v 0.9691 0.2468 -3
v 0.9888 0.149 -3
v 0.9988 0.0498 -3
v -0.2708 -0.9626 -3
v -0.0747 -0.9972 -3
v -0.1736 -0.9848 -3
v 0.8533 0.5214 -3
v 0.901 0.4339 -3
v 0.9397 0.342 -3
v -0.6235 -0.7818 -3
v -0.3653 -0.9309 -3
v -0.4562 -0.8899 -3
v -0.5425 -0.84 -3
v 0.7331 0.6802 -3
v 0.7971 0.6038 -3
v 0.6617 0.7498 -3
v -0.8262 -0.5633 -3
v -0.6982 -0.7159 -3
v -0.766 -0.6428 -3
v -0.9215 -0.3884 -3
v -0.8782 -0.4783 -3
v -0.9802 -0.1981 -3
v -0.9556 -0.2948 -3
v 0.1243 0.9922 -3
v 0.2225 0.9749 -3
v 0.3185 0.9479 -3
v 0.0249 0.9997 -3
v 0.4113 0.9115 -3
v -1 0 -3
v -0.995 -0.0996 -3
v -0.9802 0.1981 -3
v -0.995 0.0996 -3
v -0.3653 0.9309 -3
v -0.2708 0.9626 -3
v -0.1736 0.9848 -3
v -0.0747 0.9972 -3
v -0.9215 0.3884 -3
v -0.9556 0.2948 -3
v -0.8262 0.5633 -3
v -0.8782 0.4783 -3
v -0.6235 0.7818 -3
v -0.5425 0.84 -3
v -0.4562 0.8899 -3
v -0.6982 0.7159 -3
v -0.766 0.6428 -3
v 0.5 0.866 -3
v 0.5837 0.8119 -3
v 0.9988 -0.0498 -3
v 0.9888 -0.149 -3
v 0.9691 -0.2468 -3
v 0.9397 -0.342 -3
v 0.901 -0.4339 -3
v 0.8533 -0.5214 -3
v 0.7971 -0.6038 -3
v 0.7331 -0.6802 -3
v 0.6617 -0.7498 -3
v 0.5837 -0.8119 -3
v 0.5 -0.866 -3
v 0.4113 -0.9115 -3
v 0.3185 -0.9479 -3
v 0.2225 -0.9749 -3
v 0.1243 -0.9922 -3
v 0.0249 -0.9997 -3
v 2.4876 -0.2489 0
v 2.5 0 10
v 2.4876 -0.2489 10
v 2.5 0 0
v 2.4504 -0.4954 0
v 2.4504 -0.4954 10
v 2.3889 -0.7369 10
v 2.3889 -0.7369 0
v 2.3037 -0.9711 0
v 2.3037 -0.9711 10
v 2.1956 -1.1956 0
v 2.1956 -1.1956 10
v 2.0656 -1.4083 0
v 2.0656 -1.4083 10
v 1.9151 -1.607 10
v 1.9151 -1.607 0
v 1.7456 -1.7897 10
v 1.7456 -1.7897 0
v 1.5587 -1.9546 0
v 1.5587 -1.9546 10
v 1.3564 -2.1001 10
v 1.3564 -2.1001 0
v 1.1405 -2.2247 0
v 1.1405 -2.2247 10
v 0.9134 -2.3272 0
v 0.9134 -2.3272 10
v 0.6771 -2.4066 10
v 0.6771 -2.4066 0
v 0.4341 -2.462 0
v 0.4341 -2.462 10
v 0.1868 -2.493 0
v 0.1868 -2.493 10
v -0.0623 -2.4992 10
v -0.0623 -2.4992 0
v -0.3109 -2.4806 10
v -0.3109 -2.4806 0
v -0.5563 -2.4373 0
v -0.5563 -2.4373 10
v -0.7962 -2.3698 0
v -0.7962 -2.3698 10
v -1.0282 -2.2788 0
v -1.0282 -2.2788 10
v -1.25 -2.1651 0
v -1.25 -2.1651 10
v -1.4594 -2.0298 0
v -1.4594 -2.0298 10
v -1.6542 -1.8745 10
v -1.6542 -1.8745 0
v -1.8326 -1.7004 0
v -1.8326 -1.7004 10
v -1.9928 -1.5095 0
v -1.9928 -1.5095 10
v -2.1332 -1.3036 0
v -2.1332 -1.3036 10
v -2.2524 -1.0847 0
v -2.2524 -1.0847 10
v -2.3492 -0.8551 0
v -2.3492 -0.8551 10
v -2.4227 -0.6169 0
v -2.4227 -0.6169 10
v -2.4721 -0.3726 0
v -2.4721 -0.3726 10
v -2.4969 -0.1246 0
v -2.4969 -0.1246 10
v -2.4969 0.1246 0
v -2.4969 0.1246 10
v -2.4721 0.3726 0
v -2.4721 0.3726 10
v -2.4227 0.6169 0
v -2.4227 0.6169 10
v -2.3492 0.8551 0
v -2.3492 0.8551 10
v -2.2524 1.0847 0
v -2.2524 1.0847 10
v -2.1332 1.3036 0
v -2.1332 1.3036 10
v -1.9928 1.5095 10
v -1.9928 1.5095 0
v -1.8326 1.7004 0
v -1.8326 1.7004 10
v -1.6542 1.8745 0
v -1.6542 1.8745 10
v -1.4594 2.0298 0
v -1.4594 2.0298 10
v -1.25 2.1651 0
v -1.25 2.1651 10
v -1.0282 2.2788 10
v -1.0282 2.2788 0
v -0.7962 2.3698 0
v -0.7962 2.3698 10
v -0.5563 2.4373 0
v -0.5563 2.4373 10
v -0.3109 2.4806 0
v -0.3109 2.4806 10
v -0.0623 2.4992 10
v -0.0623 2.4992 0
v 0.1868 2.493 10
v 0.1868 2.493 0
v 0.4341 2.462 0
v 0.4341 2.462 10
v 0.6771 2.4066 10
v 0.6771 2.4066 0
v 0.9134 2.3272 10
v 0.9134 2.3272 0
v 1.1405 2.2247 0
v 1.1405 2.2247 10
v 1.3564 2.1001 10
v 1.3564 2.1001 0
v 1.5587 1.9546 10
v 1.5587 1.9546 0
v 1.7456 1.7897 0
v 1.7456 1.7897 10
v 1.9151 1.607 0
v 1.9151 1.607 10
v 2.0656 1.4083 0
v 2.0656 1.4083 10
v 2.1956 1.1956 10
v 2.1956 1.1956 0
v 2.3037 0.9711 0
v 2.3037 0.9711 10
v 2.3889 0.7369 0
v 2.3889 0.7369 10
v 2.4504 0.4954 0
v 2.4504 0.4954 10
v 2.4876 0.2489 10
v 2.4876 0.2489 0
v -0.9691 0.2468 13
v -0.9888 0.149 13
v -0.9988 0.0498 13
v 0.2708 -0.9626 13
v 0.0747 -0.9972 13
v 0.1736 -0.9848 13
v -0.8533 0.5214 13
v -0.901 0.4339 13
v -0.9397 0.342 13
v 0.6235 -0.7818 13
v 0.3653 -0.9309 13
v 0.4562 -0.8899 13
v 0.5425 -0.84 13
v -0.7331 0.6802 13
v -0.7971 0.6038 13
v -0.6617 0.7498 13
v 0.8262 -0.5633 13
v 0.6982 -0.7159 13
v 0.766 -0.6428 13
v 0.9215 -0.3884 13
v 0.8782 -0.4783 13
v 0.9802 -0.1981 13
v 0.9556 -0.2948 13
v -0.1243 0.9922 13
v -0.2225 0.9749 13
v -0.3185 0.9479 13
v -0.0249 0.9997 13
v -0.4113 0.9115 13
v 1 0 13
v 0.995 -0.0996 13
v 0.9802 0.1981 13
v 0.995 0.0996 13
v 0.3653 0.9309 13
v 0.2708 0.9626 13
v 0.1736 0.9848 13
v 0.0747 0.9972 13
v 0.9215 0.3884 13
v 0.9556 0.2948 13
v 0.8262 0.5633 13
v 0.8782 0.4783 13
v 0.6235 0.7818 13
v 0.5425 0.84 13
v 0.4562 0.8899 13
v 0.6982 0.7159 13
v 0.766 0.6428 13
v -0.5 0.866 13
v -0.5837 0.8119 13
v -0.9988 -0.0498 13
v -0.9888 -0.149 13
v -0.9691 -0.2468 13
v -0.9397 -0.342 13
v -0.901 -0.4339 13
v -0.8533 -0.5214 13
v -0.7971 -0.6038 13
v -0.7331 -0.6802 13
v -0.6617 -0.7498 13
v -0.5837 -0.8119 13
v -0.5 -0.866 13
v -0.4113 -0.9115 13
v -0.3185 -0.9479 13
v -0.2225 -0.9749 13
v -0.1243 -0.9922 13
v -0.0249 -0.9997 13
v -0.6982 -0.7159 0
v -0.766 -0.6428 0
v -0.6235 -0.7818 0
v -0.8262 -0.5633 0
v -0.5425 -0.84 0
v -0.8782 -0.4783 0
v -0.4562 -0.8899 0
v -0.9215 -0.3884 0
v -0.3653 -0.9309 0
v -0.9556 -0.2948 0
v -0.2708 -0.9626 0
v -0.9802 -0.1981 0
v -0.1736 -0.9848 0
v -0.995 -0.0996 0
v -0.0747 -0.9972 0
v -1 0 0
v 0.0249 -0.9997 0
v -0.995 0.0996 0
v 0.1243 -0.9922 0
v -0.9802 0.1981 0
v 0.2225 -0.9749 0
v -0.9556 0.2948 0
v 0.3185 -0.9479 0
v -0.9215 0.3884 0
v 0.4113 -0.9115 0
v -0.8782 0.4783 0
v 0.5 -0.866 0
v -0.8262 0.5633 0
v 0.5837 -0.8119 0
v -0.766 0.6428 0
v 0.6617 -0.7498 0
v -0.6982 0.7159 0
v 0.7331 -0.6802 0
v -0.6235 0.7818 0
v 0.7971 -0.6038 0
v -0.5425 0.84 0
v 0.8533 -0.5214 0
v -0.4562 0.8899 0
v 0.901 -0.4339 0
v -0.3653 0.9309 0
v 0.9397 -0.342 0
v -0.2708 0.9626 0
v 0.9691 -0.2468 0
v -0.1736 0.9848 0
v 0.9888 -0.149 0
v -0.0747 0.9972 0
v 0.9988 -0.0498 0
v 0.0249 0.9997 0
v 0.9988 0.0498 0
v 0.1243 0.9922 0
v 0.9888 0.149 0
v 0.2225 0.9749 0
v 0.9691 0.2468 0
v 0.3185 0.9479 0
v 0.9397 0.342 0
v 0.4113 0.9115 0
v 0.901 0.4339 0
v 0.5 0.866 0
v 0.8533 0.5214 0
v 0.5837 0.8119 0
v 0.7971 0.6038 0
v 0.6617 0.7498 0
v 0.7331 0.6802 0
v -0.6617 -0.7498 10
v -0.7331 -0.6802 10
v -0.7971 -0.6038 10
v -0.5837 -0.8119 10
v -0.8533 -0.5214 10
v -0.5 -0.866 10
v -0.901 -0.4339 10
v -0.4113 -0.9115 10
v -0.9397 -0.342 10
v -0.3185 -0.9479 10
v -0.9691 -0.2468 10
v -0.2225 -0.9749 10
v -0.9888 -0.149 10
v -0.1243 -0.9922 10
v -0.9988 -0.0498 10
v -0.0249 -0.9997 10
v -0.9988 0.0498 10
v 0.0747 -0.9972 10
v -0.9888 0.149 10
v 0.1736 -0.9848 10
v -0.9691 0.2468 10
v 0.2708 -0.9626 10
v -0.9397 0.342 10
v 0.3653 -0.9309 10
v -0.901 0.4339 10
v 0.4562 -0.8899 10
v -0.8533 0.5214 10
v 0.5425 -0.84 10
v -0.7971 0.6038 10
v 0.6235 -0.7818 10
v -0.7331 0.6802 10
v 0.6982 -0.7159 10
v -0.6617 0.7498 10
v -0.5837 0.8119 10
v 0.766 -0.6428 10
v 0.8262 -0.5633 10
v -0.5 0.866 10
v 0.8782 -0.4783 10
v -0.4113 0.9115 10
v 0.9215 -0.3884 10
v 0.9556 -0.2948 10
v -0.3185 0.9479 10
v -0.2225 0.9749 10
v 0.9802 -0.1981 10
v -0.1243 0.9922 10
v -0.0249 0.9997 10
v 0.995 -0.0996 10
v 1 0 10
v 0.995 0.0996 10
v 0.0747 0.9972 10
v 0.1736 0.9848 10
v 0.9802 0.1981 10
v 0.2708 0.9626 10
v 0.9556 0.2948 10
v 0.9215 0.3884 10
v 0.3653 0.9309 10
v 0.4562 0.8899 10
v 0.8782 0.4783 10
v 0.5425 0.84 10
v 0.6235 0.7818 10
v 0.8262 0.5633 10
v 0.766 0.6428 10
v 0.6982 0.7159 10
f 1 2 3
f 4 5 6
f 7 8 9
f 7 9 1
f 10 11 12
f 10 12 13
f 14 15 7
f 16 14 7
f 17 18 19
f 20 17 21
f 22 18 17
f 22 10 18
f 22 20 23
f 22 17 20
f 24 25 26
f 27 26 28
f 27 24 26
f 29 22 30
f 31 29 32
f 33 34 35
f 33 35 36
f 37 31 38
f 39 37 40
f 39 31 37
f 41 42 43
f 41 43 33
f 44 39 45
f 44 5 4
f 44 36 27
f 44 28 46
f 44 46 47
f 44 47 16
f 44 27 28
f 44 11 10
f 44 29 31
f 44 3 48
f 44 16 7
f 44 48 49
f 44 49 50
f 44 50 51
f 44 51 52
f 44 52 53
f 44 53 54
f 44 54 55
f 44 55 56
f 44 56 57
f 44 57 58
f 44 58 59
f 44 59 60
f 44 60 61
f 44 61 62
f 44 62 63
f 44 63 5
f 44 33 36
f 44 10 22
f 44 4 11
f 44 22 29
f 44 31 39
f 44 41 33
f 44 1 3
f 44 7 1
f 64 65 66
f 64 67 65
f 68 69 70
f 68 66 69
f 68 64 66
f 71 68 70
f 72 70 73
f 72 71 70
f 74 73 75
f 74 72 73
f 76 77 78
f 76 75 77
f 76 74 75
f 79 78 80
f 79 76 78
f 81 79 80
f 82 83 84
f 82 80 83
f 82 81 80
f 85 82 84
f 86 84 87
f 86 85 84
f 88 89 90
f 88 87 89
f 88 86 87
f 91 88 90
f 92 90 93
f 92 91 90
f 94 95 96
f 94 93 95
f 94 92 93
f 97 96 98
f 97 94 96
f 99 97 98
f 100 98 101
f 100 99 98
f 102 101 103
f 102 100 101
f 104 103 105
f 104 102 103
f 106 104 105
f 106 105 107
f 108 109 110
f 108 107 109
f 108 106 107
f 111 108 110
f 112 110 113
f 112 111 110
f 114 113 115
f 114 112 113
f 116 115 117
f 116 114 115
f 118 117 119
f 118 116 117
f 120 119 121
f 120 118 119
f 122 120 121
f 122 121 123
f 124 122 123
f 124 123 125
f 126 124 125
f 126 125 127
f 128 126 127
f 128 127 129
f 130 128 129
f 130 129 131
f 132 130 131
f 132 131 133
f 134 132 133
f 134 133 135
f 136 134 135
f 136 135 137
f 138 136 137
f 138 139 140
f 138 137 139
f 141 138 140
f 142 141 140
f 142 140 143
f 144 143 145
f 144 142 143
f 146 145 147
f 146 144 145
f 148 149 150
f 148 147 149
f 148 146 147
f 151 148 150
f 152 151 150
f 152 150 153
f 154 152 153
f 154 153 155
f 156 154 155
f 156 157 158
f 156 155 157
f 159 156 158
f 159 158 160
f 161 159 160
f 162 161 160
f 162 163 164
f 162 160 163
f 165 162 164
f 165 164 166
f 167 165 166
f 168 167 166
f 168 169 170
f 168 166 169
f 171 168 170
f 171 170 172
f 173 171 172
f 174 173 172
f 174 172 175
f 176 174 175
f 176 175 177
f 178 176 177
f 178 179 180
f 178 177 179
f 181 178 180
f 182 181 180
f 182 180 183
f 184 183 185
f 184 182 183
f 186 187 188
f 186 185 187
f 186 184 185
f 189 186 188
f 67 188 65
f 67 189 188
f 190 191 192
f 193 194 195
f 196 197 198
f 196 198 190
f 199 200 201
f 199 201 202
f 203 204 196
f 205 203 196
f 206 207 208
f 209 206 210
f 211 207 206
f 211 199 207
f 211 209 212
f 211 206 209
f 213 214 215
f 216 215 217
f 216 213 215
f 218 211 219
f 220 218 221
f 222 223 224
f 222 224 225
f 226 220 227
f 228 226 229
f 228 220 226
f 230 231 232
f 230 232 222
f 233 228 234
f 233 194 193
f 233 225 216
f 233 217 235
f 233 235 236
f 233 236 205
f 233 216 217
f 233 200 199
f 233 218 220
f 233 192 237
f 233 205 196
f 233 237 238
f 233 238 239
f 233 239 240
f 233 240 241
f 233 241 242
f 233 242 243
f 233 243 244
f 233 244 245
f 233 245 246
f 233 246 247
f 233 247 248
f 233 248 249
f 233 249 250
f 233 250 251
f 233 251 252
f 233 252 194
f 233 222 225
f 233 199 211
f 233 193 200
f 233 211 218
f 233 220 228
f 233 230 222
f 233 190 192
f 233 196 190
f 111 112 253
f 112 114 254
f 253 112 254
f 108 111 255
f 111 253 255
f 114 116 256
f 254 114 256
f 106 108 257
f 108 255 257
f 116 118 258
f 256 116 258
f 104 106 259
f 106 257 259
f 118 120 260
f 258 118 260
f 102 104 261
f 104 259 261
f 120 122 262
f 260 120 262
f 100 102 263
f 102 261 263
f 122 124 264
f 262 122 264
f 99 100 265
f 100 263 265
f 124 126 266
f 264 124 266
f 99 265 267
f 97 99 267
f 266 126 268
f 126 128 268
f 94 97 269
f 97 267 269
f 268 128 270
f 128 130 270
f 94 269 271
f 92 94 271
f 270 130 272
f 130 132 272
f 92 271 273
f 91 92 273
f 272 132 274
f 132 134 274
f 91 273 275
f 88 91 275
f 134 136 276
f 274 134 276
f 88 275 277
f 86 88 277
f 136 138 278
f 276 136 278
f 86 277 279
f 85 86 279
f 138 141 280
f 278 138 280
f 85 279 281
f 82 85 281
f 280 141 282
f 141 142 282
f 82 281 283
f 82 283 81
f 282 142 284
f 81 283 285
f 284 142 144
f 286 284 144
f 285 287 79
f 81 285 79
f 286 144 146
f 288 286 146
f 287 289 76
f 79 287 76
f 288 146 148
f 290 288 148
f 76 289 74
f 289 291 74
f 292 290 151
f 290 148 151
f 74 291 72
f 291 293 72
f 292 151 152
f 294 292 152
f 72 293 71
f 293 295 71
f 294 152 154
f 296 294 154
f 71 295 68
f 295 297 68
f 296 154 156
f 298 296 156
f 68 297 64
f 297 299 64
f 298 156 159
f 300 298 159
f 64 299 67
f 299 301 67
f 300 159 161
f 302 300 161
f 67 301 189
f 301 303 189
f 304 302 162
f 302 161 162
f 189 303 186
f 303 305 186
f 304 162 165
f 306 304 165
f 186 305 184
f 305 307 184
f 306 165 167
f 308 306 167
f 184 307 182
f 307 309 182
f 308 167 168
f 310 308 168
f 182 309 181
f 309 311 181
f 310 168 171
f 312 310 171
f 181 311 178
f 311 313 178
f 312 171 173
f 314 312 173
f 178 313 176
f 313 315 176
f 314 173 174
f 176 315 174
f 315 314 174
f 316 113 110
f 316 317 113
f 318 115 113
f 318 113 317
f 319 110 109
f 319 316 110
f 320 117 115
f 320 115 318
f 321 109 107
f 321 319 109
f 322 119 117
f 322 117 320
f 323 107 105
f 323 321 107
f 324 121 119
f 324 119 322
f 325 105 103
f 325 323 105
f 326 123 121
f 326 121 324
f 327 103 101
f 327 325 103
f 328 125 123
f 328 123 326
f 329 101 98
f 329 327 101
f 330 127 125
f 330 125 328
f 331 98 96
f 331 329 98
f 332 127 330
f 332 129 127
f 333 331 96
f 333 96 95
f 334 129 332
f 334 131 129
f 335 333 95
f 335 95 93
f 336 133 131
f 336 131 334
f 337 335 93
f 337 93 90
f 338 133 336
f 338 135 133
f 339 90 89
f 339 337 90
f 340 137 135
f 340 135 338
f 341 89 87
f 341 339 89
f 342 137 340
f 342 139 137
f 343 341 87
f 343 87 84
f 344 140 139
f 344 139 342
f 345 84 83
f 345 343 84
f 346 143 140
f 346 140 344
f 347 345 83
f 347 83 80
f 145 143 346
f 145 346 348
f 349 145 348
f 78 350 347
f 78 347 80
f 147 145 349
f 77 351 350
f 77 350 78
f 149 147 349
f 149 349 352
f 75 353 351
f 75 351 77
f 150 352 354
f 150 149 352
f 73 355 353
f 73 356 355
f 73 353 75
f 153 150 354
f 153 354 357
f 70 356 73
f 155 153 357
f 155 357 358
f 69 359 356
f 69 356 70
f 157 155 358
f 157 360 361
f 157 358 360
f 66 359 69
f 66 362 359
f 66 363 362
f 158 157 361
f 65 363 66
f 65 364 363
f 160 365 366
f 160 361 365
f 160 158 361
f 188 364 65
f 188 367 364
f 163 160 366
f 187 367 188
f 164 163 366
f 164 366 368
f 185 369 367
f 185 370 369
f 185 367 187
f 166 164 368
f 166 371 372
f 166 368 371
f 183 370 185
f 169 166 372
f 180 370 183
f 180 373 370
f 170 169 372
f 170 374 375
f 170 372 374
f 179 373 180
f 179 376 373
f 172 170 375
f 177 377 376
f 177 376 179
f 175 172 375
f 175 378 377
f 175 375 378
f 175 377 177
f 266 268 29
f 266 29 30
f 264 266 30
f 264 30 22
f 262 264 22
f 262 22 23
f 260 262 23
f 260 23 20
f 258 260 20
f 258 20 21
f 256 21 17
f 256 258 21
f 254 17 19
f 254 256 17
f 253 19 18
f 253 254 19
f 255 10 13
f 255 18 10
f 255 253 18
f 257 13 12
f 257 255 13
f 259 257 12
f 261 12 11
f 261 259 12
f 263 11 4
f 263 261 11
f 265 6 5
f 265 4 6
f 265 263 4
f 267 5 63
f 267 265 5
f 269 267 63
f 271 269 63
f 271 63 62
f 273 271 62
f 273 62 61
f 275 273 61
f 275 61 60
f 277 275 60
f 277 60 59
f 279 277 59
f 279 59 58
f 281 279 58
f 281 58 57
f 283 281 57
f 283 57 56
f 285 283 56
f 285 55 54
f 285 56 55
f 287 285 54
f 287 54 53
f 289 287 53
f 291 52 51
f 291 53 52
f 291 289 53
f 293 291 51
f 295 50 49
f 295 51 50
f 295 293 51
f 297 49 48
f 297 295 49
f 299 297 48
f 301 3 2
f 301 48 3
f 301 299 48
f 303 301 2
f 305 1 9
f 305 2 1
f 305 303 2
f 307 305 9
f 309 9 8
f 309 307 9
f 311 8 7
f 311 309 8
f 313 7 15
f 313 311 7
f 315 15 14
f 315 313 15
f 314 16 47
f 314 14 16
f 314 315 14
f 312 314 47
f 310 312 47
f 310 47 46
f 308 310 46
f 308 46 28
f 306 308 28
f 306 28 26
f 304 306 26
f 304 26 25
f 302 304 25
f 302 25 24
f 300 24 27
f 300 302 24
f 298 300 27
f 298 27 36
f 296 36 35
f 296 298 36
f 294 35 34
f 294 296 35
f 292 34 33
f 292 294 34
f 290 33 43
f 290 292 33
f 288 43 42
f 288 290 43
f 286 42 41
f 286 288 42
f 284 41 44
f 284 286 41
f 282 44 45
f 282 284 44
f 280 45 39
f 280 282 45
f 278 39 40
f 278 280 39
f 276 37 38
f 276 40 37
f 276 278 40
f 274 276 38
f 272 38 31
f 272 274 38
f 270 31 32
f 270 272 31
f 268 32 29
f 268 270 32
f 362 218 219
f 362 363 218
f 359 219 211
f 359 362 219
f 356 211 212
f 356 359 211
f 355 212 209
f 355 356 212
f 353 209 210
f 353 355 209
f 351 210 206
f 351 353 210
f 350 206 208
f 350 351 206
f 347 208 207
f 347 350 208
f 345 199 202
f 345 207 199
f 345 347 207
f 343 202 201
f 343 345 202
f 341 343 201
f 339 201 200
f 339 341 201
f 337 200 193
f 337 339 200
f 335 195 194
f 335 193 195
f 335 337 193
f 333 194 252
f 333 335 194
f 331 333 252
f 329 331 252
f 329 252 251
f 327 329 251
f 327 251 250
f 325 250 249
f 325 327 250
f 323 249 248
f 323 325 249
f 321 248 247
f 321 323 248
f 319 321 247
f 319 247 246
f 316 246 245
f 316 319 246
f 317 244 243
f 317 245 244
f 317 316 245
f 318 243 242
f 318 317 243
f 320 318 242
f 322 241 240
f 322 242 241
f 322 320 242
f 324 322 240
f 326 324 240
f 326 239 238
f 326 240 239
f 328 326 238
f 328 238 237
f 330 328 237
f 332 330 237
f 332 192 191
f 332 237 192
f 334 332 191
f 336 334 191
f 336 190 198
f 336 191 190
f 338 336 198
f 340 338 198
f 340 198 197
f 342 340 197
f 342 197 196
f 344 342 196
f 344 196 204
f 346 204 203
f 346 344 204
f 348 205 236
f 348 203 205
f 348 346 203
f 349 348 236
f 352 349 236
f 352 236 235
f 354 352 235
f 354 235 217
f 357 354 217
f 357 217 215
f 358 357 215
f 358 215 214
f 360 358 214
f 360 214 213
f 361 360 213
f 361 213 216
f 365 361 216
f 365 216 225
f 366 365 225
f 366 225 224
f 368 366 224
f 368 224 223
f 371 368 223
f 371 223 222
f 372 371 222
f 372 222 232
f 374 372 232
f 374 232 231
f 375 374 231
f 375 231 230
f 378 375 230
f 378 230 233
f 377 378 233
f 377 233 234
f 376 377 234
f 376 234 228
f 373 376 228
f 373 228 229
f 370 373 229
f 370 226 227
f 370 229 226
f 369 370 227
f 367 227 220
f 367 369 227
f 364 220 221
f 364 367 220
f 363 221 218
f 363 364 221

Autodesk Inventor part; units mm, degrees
ref_plane "YZ Plane" through (0, 0, 0) normal (1, 0, 0) x (0, 1, 0)
ref_plane "XZ Plane" through (0, 0, 0) normal (0, 1, 0) x (-1, 0, 0)
ref_plane "XY Plane" through (0, 0, 0) normal (0, 0, 1) x (1, 0, 0)
sketch "Sketch1" plane through (0, 0, 0) normal (0, 0, 1) x (1, 0, 0)
  circle A0 centre (0, 0) radius 2.5
  dimension "d0" = 5
extrude "Extrusion1" add sketch "Sketch1" along normal blind 10
sketch "Sketch2" plane through (0, 0, 10) normal (0, 0, 1) x (1, 0, 0)
  circle A0 centre (0, 0) radius 2.5 projected
  circle A1 centre (0, 0) radius 1
  dimension "d3" = 2
extrude "Extrusion2" add sketch "Sketch2" along normal blind 3 contours A1
sketch "Sketch3" plane through (0, 0, 0) normal (0, 0, -1) x (-1, 0, 0)
  circle A0 centre (0, 0) radius 1
  dimension "d6" = 2
extrude "Extrusion3" add sketch "Sketch3" along normal blind 3
properties part number "Bone-1cm"
